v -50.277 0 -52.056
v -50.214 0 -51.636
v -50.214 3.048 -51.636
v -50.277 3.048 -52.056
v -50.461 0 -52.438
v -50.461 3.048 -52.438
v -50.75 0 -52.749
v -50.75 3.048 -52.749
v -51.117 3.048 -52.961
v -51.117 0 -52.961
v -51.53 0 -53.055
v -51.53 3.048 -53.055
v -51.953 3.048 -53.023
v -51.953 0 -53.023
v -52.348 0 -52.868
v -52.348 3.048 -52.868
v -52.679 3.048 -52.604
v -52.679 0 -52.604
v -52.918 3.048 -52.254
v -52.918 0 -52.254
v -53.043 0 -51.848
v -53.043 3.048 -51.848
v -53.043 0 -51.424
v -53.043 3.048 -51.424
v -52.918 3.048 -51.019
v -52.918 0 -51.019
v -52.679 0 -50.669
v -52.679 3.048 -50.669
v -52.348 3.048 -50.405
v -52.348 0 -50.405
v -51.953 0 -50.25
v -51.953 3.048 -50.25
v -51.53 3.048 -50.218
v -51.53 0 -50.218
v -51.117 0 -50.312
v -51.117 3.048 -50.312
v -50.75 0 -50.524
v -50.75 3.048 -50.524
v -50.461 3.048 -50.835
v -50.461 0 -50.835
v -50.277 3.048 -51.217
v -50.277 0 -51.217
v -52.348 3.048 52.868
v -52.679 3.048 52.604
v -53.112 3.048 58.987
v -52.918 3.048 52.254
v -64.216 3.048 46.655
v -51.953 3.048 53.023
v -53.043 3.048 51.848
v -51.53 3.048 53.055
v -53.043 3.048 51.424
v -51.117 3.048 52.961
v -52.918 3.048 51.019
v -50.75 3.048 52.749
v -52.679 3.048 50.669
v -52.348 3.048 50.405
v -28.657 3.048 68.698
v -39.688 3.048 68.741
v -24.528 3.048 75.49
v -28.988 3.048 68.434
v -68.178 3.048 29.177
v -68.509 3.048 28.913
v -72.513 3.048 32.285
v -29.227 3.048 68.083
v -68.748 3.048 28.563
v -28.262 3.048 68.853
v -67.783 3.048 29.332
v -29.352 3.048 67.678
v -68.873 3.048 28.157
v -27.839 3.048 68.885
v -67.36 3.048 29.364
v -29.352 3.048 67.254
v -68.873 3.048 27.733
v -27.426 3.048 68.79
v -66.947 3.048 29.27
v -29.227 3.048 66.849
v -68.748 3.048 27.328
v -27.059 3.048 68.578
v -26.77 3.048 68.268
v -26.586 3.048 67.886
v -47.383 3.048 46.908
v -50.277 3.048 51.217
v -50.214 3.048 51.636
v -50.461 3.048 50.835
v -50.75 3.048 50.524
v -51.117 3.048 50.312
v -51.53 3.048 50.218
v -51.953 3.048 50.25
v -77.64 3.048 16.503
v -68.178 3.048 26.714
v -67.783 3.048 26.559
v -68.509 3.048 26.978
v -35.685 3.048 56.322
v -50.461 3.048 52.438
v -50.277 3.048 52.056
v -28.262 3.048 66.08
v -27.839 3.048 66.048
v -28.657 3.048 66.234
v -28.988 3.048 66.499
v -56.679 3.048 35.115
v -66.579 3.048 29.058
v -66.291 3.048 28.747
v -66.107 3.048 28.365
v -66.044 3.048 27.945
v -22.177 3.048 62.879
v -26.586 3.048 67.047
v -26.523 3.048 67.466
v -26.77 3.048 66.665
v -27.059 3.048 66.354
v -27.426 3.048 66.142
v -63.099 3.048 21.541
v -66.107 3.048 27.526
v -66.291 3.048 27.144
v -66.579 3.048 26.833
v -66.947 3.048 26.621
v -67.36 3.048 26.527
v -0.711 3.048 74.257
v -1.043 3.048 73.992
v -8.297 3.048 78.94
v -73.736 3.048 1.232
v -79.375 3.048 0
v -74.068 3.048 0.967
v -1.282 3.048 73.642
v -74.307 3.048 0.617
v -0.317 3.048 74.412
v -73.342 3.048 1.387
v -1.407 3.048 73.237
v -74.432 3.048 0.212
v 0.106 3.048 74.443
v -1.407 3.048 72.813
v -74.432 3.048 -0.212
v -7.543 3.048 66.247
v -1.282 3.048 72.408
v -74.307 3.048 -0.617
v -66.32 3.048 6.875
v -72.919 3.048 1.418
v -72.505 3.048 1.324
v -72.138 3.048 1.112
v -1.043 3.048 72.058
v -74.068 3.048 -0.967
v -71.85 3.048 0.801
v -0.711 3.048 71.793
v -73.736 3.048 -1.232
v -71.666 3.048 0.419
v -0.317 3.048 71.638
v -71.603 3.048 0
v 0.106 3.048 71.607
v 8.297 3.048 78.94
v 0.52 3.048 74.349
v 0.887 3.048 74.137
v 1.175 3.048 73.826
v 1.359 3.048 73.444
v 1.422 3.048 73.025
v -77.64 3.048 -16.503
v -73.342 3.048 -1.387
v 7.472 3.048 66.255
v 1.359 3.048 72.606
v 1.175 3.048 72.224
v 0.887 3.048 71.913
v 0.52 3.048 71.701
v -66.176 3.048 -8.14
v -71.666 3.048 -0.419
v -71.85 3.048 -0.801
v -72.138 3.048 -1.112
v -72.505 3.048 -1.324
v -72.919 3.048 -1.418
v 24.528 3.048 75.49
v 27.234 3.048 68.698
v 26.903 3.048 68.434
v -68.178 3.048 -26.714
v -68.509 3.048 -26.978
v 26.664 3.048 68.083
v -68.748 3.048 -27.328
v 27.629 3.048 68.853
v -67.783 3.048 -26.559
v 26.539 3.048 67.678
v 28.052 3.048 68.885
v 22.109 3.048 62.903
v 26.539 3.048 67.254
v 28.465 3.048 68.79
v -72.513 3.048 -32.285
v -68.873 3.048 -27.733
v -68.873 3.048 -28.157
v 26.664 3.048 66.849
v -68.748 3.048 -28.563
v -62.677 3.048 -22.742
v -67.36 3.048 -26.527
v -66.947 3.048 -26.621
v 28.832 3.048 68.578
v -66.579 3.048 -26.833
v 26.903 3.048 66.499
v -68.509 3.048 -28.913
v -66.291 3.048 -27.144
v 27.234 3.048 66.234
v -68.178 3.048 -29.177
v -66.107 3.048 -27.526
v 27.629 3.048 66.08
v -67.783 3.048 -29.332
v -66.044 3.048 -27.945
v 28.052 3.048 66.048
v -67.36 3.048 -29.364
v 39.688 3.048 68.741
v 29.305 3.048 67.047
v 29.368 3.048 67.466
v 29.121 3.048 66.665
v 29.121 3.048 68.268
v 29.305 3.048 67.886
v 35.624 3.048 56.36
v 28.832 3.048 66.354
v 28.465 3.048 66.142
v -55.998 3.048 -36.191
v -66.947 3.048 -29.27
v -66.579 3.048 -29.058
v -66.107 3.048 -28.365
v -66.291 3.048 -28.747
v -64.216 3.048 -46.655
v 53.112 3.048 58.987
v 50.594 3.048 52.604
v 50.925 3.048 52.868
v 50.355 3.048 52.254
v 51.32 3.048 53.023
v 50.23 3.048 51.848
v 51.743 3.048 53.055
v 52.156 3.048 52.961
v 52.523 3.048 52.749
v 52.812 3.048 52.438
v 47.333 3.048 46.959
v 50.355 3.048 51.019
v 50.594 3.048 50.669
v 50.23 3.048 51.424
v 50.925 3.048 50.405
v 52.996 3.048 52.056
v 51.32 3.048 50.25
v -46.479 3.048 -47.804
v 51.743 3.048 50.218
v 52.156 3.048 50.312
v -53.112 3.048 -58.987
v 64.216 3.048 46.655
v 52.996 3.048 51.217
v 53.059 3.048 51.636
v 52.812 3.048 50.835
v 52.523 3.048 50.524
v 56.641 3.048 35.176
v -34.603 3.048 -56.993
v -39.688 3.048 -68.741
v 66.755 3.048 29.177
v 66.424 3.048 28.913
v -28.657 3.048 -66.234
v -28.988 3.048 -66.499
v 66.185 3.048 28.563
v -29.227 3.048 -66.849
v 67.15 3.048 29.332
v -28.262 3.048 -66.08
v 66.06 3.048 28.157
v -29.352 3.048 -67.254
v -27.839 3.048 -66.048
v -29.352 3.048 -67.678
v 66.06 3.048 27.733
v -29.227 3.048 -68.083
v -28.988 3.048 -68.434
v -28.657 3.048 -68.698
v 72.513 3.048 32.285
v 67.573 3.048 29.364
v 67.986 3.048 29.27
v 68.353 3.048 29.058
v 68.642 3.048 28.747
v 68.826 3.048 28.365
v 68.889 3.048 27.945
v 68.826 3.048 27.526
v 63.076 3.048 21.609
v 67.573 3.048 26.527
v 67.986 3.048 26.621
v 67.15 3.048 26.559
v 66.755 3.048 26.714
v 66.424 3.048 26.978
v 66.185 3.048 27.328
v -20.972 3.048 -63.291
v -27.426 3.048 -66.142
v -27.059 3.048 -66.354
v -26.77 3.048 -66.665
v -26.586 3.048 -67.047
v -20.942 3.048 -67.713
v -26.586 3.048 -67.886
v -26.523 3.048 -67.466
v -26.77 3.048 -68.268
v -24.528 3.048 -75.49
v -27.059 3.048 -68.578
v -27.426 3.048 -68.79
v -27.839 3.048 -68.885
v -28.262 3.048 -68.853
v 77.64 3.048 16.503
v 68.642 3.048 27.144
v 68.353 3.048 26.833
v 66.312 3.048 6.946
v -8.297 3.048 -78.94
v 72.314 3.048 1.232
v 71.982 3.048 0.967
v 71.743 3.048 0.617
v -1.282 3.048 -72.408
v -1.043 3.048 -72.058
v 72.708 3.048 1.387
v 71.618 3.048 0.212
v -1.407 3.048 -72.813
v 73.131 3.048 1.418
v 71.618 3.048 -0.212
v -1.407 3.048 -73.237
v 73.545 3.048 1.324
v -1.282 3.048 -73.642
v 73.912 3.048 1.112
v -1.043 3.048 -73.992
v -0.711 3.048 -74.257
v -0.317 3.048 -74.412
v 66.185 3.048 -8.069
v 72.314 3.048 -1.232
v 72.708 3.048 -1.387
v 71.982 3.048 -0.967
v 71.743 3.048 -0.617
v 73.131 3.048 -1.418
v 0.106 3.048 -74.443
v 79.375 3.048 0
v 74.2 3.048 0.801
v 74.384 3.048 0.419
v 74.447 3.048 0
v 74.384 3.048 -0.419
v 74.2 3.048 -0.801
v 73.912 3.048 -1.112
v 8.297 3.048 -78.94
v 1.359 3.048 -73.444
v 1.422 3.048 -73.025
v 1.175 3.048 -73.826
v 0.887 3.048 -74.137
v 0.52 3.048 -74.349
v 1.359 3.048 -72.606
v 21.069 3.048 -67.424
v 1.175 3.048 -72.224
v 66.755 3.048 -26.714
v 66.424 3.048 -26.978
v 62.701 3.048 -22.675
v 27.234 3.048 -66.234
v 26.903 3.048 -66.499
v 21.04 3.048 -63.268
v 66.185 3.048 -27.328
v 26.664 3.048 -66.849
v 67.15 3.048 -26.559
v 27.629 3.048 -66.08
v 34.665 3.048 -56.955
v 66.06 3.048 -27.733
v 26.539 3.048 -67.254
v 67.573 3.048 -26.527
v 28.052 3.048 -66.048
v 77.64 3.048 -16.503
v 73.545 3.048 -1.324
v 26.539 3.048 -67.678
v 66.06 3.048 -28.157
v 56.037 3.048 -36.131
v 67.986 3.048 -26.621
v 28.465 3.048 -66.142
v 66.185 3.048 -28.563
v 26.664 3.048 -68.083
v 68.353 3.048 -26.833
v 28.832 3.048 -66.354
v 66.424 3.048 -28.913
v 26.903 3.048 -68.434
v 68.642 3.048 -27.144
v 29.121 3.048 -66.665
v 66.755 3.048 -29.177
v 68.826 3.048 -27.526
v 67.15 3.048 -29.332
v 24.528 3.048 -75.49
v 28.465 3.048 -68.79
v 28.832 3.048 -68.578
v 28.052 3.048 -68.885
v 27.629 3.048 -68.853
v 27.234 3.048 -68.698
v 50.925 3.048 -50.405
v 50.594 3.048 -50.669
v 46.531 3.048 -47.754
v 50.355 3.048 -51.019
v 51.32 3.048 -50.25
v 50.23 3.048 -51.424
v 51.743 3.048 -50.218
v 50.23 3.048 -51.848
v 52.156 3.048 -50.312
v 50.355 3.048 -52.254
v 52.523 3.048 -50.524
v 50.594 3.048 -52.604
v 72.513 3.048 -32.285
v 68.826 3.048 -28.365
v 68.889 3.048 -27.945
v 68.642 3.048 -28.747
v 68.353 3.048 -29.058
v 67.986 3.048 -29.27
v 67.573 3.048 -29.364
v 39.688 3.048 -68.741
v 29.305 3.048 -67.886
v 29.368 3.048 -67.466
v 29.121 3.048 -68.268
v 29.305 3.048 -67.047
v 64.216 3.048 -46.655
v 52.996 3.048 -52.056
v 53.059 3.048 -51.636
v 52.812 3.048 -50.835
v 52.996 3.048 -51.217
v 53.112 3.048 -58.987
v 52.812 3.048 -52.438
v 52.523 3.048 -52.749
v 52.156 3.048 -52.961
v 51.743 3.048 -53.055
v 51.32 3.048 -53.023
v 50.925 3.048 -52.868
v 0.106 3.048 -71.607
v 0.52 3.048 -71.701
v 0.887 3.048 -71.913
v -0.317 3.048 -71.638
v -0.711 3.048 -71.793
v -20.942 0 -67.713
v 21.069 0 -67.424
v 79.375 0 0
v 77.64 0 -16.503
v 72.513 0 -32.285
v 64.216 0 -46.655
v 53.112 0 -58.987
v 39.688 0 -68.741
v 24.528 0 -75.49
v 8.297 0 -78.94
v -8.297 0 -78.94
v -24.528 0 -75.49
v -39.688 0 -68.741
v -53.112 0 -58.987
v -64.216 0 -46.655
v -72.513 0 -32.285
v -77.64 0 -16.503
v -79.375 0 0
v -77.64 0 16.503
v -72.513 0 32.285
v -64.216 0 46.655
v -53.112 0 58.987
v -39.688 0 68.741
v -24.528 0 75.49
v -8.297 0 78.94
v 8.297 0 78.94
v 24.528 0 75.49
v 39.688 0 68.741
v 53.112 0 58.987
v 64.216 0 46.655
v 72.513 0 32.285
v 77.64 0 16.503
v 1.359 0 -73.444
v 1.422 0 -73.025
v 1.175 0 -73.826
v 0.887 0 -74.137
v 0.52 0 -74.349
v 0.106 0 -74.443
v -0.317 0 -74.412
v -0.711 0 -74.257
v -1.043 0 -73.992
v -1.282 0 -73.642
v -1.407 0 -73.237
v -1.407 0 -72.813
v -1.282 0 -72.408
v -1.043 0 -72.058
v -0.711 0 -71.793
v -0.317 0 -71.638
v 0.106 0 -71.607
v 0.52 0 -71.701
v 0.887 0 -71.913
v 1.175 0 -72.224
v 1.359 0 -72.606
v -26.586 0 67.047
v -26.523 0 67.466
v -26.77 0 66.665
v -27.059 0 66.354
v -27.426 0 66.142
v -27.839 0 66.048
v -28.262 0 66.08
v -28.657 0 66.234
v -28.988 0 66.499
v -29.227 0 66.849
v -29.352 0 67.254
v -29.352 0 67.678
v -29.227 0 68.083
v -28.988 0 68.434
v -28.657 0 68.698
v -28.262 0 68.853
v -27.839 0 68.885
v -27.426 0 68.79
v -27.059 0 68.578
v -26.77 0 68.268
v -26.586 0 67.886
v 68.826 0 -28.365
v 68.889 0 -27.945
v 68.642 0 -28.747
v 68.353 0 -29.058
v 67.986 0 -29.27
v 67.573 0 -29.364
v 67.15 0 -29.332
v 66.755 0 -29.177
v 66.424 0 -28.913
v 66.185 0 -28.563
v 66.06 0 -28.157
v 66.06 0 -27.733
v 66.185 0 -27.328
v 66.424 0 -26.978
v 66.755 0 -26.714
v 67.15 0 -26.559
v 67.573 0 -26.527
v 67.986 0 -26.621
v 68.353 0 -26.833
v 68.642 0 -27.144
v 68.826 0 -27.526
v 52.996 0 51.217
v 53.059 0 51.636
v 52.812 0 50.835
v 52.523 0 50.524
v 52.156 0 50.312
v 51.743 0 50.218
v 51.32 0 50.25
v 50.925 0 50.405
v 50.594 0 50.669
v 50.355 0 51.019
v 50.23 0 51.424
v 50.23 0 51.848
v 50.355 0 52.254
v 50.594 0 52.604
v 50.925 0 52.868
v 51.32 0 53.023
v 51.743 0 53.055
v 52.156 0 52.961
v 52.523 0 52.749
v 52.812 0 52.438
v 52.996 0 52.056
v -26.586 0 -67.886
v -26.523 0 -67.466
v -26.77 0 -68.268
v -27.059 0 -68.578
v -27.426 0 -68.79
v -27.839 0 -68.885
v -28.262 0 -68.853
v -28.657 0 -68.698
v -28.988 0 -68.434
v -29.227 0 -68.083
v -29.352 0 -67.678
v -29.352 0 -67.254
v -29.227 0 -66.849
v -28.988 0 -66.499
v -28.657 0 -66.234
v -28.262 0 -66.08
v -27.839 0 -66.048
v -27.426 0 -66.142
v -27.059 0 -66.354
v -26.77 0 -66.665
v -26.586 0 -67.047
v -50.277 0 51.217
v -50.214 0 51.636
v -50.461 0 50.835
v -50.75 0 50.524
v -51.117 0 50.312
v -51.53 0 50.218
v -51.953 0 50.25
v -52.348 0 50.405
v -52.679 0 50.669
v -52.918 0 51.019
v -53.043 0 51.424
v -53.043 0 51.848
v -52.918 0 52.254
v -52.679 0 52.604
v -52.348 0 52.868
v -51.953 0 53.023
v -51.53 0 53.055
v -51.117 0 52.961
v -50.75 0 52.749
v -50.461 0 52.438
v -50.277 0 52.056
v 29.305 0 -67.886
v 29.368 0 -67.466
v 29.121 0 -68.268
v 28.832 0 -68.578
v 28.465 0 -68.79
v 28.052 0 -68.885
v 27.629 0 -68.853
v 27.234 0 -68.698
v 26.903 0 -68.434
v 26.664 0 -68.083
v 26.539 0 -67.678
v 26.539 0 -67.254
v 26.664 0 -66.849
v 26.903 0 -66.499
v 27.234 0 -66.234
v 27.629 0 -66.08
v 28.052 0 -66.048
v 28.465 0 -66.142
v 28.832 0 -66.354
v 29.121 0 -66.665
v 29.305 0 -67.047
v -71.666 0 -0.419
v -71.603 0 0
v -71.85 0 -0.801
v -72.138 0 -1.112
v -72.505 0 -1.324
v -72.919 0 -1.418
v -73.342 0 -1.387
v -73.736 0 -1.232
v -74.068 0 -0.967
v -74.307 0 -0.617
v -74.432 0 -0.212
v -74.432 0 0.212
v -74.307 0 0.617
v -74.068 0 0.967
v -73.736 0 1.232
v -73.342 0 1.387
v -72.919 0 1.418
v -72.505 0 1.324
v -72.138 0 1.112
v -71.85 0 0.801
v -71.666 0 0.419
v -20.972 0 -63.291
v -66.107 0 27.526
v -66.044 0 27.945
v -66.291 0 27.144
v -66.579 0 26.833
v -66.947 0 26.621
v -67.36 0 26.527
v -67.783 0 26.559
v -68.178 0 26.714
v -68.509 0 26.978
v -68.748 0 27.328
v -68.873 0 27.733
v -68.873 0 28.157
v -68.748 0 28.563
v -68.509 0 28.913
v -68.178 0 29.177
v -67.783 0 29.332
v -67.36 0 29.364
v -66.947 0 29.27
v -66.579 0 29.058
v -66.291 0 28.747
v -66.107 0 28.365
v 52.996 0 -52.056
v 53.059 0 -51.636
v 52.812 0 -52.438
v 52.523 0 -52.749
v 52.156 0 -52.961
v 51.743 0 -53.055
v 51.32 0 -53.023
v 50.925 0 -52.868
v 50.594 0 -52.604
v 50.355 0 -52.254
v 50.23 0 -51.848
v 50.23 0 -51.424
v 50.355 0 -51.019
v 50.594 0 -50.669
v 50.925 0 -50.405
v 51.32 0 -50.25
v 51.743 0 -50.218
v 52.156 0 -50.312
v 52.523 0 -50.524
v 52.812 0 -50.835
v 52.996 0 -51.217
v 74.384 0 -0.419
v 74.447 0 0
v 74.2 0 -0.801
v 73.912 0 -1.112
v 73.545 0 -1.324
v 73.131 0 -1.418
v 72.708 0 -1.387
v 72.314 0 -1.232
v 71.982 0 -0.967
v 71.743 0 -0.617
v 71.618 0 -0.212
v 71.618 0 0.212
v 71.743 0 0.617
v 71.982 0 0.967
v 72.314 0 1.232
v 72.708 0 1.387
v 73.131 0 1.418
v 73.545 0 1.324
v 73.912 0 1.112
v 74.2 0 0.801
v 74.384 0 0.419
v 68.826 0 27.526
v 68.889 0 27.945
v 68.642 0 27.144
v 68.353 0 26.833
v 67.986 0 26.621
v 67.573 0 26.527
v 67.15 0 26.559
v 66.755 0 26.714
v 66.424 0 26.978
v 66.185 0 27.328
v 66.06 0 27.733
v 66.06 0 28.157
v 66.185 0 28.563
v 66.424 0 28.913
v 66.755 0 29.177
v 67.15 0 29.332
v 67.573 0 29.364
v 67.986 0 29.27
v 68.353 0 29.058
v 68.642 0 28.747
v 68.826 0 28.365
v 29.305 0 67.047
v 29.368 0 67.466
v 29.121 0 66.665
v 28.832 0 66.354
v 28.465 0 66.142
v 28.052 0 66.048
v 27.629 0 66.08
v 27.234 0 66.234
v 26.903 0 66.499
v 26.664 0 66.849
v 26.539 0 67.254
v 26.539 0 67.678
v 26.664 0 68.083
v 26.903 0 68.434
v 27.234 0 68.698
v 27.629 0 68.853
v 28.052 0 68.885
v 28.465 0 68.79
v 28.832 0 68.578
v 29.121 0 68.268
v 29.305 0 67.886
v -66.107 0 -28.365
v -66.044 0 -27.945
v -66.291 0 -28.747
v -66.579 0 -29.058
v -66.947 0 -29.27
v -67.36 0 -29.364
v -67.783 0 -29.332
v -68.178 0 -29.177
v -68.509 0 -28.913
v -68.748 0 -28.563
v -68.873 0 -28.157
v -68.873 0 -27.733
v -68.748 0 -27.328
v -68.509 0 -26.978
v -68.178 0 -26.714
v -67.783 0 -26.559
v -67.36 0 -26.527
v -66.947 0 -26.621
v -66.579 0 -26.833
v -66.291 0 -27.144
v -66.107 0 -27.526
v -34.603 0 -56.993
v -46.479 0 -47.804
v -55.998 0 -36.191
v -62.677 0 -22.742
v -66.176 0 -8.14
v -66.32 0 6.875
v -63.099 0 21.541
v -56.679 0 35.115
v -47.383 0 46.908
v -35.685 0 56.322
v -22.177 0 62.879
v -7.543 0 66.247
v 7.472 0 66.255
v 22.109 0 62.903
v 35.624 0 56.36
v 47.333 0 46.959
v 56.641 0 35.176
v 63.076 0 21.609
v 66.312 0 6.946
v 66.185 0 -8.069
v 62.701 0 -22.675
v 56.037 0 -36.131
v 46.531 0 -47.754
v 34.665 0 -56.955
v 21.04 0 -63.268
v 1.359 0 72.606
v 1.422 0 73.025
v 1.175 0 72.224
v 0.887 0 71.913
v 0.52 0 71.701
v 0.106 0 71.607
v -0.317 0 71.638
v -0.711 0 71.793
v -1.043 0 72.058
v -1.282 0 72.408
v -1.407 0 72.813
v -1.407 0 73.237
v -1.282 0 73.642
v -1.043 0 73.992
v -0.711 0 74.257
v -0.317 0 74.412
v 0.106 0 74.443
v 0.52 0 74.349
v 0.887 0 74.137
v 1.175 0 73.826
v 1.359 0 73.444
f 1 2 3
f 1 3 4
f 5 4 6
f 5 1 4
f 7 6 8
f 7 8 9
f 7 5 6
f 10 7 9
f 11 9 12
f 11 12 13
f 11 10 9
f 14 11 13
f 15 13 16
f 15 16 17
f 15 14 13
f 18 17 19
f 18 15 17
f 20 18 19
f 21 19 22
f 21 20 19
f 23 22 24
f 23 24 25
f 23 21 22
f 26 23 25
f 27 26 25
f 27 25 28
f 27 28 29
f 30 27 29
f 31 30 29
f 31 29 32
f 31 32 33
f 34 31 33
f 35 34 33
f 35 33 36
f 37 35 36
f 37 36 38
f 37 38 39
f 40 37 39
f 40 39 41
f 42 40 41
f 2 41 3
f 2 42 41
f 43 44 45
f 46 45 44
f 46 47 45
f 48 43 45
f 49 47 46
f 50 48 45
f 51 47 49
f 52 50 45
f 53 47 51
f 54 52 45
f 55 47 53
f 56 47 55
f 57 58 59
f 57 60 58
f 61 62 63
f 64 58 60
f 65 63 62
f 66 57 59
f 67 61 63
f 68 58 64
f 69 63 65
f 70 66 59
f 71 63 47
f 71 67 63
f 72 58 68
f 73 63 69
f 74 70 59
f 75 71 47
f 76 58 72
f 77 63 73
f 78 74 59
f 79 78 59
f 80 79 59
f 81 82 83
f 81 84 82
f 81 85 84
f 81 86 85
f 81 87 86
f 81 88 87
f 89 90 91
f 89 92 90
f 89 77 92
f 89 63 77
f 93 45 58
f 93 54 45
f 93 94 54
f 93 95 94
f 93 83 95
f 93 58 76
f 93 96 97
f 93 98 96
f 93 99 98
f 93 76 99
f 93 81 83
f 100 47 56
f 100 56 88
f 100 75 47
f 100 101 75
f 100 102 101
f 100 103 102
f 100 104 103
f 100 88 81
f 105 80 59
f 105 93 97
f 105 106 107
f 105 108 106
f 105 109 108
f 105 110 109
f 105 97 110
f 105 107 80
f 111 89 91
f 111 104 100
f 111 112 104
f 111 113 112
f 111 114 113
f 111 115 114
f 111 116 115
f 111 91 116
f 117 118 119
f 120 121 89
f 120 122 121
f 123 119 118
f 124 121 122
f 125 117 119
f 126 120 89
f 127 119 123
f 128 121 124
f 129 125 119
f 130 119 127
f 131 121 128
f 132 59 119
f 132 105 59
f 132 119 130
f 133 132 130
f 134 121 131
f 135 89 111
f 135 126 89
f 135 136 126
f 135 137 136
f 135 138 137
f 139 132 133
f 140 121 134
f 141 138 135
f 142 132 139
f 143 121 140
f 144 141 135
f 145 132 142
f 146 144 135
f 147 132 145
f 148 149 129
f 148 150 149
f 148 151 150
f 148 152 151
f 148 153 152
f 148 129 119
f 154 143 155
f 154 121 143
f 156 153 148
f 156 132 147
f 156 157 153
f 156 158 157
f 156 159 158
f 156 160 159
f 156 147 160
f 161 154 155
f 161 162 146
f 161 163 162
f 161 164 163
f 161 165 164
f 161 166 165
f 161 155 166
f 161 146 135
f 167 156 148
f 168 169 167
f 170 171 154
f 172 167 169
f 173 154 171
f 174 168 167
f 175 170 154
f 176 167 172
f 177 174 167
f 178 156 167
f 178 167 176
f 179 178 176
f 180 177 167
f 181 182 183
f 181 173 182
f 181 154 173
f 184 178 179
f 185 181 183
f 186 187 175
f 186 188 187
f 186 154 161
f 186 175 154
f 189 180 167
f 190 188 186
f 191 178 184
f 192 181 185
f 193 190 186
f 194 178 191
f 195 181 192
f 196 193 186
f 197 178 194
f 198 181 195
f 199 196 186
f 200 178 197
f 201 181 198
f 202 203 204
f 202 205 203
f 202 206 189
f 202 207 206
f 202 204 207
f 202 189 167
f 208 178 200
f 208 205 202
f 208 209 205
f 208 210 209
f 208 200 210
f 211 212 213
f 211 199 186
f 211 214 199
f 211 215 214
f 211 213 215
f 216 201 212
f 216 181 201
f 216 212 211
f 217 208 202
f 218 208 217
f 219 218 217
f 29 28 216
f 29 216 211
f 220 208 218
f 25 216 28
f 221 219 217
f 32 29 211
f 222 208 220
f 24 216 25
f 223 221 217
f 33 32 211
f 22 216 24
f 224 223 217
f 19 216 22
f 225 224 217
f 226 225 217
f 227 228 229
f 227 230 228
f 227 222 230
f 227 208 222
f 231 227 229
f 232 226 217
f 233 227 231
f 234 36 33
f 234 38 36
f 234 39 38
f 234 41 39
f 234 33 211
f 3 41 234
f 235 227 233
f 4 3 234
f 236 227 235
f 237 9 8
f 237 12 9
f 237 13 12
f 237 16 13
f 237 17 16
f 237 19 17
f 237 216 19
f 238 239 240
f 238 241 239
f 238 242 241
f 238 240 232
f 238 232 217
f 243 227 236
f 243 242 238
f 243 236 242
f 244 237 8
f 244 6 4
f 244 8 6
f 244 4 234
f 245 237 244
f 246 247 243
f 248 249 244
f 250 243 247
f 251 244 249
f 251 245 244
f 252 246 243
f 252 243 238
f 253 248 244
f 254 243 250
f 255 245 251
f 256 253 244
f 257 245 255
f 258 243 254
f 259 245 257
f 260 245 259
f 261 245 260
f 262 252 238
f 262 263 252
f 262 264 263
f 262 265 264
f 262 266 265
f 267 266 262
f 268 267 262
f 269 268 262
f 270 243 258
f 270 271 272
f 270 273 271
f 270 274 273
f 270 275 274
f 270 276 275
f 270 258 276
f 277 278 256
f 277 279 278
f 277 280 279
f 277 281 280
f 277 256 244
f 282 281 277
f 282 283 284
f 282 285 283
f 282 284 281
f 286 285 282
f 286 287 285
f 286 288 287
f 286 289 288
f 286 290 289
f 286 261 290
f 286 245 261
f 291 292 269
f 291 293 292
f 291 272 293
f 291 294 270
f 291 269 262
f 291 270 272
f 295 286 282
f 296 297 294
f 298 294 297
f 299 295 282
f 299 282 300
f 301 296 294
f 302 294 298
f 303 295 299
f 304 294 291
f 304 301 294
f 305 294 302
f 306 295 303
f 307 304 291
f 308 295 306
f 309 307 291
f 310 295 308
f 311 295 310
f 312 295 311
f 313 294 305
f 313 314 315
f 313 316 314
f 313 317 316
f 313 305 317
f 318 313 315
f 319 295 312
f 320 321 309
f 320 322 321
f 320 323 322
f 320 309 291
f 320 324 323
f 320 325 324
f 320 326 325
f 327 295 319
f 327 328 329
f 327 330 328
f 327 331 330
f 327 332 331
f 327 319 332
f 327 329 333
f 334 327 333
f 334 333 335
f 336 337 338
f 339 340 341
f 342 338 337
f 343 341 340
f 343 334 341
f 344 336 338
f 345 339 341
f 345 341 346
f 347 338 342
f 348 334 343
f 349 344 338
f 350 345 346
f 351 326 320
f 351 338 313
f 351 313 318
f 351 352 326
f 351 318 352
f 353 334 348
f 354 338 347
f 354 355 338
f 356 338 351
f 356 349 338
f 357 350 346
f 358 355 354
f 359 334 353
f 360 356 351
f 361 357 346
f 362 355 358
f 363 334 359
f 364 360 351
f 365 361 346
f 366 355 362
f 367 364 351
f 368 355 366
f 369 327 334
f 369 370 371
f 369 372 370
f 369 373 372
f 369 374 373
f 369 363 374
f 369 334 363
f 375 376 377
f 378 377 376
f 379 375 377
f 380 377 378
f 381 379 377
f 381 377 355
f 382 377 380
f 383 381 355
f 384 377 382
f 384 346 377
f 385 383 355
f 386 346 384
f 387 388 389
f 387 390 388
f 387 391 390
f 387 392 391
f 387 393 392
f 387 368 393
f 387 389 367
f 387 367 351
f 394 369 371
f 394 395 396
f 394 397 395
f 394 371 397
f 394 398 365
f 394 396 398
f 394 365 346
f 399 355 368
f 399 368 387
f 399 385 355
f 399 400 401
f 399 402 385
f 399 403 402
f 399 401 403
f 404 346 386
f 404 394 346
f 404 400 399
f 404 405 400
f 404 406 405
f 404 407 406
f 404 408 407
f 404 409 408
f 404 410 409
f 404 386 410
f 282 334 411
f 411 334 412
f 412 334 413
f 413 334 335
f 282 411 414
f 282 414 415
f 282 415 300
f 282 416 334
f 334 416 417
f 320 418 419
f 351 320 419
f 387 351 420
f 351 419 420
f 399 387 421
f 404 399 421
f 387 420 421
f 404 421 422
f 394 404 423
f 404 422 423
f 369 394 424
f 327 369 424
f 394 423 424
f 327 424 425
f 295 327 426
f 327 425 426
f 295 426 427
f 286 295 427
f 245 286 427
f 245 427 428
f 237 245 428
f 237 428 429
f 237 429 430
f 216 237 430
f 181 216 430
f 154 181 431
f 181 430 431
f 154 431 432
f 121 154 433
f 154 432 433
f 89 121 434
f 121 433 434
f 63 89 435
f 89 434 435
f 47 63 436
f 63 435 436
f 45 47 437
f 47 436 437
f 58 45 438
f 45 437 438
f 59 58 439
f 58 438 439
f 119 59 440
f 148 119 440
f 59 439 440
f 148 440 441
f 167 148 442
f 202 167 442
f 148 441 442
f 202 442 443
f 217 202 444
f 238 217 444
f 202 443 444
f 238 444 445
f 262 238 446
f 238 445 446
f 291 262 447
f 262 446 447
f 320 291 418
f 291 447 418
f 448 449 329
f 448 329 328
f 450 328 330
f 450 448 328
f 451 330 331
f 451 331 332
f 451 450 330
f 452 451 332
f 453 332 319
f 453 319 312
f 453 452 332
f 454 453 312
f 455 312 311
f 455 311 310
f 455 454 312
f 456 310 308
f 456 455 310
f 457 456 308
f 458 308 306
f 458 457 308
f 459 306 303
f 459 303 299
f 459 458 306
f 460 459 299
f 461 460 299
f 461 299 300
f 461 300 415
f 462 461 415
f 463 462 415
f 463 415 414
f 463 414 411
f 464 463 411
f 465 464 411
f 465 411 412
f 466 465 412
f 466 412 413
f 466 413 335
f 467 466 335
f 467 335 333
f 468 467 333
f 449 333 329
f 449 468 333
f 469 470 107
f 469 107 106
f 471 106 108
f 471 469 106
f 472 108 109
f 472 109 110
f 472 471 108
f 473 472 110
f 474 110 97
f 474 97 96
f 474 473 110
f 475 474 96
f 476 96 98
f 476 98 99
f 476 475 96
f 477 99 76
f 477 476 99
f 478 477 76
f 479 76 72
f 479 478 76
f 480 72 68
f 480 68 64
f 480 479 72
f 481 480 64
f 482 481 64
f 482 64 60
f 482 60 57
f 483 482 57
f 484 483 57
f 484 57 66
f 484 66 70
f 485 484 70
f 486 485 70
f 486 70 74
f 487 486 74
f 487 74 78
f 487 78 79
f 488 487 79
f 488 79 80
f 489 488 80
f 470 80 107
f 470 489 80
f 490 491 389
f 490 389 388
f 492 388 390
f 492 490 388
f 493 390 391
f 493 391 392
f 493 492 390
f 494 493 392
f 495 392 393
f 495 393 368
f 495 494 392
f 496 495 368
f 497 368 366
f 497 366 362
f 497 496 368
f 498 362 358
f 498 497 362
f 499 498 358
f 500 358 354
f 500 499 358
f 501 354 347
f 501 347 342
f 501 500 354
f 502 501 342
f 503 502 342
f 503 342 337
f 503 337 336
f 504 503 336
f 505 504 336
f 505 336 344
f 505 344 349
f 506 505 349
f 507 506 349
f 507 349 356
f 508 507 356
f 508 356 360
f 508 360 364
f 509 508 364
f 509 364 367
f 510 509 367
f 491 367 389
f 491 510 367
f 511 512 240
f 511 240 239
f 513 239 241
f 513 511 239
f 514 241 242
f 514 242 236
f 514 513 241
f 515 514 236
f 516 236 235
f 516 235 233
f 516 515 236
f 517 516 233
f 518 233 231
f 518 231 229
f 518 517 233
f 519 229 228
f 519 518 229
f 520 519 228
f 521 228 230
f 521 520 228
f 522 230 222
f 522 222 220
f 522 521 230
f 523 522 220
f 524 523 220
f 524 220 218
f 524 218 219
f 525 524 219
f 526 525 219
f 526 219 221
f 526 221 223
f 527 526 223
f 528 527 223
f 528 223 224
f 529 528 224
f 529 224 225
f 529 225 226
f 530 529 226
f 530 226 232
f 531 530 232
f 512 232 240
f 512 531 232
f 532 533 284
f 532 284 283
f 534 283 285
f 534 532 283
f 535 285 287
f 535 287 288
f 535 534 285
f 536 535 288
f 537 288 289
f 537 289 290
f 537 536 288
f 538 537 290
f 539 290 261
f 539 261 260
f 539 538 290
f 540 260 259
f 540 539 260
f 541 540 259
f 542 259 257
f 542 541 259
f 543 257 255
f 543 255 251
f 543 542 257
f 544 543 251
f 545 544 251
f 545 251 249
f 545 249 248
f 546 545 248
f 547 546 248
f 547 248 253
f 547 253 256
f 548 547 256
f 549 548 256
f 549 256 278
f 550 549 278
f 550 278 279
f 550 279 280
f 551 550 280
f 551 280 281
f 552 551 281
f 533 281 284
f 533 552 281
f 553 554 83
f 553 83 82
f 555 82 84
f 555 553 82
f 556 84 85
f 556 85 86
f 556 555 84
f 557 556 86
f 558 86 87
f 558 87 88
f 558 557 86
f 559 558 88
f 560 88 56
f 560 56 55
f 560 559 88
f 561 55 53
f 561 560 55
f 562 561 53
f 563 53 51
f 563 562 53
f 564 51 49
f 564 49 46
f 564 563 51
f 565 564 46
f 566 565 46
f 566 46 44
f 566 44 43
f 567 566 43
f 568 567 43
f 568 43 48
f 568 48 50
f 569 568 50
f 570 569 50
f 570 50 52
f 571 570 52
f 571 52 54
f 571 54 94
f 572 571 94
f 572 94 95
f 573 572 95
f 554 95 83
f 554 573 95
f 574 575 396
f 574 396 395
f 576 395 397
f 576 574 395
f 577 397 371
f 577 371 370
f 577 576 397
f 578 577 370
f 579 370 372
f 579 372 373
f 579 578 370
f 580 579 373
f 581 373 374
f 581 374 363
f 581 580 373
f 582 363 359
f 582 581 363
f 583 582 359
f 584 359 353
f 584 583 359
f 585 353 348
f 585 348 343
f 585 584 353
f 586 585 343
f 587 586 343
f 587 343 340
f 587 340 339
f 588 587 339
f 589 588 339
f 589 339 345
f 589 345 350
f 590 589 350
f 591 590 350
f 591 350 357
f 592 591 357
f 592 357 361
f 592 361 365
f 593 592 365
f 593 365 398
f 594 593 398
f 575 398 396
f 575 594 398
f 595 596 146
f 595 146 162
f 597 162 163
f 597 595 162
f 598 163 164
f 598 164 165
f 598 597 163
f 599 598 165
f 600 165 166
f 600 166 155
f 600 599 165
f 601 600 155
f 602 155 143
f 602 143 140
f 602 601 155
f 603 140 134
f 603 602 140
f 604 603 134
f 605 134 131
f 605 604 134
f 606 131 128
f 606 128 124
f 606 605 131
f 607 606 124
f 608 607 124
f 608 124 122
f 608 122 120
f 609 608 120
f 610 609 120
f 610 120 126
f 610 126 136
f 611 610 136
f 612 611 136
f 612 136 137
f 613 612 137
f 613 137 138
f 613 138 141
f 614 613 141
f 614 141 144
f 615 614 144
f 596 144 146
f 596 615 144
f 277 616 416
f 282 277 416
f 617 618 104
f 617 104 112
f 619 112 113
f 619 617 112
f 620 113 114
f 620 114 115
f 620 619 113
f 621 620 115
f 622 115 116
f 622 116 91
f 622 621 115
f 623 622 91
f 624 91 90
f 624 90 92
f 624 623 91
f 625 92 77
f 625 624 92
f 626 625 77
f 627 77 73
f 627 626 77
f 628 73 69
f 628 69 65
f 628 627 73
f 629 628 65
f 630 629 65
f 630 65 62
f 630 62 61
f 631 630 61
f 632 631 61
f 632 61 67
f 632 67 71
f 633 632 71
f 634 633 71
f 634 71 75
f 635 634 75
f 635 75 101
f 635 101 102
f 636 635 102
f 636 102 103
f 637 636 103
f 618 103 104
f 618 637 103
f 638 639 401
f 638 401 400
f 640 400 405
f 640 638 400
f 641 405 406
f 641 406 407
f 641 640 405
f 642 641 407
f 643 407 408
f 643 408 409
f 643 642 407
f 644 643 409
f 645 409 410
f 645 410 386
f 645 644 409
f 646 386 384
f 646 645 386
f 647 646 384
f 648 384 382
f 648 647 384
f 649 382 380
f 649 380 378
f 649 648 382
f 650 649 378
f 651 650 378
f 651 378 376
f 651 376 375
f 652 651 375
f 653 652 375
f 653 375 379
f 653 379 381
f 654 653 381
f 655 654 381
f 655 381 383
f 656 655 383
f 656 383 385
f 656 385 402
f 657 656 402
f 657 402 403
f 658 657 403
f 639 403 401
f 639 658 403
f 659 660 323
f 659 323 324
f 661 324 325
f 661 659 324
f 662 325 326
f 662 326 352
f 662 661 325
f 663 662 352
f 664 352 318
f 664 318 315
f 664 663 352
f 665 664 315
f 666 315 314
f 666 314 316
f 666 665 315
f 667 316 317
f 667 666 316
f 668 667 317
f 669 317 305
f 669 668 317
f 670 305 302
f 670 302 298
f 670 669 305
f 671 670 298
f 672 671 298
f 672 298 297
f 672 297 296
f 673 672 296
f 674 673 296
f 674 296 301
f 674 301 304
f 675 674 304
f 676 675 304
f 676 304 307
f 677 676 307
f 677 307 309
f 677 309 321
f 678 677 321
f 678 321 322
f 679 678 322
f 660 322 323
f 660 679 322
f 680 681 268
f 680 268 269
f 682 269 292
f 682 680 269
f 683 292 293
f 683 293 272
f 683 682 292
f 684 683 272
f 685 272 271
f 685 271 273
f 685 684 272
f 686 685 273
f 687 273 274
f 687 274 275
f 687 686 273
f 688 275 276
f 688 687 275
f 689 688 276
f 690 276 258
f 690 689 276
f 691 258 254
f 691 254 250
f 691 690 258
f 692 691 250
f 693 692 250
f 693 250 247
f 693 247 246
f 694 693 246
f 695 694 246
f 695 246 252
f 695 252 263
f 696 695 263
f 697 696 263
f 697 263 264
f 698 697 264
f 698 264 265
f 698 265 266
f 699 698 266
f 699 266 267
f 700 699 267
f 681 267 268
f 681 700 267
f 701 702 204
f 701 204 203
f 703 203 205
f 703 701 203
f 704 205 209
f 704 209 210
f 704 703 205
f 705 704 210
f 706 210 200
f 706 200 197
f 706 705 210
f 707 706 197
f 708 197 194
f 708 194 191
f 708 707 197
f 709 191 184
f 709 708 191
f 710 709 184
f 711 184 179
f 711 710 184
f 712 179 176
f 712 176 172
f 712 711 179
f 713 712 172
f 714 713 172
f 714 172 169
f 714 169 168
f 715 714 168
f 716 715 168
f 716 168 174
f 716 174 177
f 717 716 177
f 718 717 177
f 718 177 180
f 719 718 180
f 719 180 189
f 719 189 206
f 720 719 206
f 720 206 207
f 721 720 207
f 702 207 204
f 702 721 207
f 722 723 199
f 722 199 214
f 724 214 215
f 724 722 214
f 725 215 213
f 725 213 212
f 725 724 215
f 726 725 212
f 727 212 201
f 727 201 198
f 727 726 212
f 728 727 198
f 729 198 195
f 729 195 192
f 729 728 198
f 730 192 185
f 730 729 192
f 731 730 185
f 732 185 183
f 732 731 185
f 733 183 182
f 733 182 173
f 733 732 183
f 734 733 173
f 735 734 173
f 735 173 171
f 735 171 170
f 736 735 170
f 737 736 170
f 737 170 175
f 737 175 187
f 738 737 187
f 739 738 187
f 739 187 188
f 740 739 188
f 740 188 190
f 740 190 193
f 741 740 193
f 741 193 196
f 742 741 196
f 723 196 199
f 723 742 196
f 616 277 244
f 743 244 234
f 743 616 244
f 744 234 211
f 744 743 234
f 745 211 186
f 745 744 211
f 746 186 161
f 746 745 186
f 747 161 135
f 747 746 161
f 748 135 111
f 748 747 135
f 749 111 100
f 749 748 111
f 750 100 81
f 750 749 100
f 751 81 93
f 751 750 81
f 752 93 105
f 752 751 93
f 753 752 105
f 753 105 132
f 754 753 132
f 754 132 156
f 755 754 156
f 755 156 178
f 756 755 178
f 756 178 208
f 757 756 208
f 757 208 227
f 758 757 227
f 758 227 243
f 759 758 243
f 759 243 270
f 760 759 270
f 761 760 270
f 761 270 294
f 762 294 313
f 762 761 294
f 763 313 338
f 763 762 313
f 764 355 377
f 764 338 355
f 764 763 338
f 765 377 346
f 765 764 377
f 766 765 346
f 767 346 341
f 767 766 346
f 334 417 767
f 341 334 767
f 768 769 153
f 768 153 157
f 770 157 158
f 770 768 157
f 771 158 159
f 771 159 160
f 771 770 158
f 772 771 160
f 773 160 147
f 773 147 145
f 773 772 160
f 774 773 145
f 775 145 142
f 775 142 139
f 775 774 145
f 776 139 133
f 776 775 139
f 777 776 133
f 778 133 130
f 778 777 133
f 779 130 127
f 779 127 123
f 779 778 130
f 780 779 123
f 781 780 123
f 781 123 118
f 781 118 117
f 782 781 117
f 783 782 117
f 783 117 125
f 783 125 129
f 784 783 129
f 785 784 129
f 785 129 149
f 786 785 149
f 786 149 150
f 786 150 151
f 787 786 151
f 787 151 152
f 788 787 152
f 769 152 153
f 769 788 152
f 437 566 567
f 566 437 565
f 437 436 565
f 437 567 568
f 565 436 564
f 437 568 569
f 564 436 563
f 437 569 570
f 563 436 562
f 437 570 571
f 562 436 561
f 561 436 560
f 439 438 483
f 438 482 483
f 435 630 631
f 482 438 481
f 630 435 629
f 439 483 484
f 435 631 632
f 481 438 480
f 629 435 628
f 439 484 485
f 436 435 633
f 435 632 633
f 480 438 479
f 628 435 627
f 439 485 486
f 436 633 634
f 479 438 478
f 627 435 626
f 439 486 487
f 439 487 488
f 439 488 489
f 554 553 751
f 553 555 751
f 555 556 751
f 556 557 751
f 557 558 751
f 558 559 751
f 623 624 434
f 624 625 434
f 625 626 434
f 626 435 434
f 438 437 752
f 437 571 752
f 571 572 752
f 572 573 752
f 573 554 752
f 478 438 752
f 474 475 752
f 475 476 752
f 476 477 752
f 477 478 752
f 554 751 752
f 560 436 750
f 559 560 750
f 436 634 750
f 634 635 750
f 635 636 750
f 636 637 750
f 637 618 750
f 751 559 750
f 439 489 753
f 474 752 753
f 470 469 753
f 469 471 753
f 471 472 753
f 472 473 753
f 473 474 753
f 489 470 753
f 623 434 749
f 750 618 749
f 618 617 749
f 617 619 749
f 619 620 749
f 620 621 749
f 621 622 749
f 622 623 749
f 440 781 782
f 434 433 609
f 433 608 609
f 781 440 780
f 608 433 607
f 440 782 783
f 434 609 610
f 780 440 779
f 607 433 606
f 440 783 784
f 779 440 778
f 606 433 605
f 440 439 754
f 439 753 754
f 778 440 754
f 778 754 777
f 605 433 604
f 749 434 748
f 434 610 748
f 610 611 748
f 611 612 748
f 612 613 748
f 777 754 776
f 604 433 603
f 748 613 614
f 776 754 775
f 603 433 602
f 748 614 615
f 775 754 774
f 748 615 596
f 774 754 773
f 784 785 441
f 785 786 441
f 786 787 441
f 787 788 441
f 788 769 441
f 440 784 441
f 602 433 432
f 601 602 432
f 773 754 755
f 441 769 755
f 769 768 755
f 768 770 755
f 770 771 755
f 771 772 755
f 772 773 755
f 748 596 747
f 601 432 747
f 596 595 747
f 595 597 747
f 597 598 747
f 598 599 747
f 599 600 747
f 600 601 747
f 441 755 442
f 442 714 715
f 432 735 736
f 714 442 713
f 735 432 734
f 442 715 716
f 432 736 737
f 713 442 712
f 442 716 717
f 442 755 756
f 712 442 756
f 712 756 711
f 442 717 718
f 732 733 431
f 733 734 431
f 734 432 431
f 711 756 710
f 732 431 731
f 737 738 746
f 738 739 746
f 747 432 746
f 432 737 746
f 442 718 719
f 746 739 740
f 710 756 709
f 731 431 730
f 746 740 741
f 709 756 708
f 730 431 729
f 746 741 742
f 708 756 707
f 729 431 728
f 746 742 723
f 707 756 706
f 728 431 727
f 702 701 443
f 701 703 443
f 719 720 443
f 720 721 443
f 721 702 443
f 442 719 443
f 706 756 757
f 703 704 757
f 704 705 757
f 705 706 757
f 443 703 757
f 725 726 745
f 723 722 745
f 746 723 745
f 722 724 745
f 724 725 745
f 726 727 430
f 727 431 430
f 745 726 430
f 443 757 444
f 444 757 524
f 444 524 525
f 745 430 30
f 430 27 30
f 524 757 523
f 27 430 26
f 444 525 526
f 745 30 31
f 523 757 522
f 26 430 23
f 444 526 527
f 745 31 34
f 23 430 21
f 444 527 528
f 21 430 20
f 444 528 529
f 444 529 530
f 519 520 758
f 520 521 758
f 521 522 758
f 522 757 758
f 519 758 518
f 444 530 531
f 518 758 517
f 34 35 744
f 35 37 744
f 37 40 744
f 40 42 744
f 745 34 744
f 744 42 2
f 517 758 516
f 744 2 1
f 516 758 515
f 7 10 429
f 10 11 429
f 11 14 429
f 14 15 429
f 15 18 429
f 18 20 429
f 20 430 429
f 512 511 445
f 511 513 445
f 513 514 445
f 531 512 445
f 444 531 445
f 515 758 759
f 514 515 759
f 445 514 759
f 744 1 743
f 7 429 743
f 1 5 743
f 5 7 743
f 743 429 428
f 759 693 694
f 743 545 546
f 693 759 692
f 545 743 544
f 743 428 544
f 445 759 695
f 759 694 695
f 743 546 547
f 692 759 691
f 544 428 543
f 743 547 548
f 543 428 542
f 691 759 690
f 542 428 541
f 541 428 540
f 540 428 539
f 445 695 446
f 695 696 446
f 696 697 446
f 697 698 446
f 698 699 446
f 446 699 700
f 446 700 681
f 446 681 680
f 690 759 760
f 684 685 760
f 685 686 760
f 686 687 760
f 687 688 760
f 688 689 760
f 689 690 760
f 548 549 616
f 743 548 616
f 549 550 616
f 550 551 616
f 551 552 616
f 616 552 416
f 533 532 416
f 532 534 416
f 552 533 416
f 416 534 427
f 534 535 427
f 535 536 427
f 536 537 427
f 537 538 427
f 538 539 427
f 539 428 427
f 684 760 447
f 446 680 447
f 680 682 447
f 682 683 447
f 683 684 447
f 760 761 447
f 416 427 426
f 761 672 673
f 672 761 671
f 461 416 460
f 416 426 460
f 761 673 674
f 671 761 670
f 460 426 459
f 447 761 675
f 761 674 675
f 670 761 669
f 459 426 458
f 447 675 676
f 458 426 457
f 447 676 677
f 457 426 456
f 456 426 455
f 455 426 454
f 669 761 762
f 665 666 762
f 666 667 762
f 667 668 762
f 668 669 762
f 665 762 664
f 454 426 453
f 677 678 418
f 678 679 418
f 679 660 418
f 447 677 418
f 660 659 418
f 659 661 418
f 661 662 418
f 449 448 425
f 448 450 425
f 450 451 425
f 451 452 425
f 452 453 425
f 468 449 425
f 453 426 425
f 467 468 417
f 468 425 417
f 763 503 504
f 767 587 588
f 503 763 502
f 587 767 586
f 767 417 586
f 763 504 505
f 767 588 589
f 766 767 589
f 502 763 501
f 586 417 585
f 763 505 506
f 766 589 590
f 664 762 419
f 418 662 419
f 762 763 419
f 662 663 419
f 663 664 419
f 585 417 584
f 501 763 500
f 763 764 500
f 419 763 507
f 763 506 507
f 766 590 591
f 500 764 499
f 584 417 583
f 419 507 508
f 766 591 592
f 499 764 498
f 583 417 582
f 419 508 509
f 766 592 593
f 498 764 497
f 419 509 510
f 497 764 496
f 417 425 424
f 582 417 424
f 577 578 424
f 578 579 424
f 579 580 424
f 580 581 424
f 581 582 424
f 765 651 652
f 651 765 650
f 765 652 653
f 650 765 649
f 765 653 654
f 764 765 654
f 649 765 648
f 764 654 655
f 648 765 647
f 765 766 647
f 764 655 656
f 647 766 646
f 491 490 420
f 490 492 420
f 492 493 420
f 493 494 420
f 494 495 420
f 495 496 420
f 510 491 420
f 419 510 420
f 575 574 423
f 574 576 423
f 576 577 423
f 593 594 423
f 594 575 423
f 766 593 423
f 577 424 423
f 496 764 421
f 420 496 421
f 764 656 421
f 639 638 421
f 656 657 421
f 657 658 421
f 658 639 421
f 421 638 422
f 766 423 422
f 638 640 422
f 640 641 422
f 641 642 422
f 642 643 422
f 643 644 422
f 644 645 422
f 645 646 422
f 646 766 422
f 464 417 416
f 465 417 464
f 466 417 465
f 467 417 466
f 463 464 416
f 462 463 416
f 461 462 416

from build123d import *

# Parameters (mm, degrees)
SKETCH2_R           = 79.375
SKETCH2_R_2         = 66.675
SKETCH2_R_3         = 1.4224
BOSS_EXTRUDE1_DEPTH = 3.048
CUT_EXTRUDE2_DEPTH  = 4.048


with BuildPart() as part:
    # Sketch2 → Boss-Extrude1 (new body)
    with BuildSketch(Plane(origin=(0, 0, 0), x_dir=(1, 0, 0), z_dir=(0, 1, 0))):
        Circle(SKETCH2_R)
        Circle(SKETCH2_R_2, mode=Mode.SUBTRACT)
        with Locations((0, 73.025)):
            Circle(SKETCH2_R_3, mode=Mode.SUBTRACT)
        with Locations((27.945457648, 67.466302862)):
            Circle(SKETCH2_R_3, mode=Mode.SUBTRACT)
        with Locations((51.636472696, 51.636472696)):
            Circle(SKETCH2_R_3, mode=Mode.SUBTRACT)
        with Locations((67.466302862, 27.945457648)):
            Circle(SKETCH2_R_3, mode=Mode.SUBTRACT)
        with Locations((73.025, 0)):
            Circle(SKETCH2_R_3, mode=Mode.SUBTRACT)
        with Locations((67.466302862, -27.945457648)):
            Circle(SKETCH2_R_3, mode=Mode.SUBTRACT)
        with Locations((51.636472696, -51.636472696)):
            Circle(SKETCH2_R_3, mode=Mode.SUBTRACT)
        with Locations((27.945457648, -67.466302862)):
            Circle(SKETCH2_R_3, mode=Mode.SUBTRACT)
        with Locations((0, -73.025)):
            Circle(SKETCH2_R_3, mode=Mode.SUBTRACT)
        with Locations((-27.945457648, -67.466302862)):
            Circle(SKETCH2_R_3, mode=Mode.SUBTRACT)
        with Locations((-51.636472696, -51.636472696)):
            Circle(SKETCH2_R_3, mode=Mode.SUBTRACT)
        with Locations((-67.466302862, -27.945457648)):
            Circle(SKETCH2_R_3, mode=Mode.SUBTRACT)
        with Locations((-73.025, 0)):
            Circle(SKETCH2_R_3, mode=Mode.SUBTRACT)
        with Locations((-67.466302862, 27.945457648)):
            Circle(SKETCH2_R_3, mode=Mode.SUBTRACT)
        with Locations((-51.636472696, 51.636472696)):
            Circle(SKETCH2_R_3, mode=Mode.SUBTRACT)
        with Locations((-27.945457648, 67.466302862)):
            Circle(SKETCH2_R_3, mode=Mode.SUBTRACT)
    extrude(amount=BOSS_EXTRUDE1_DEPTH)

    # Sketch5 → Cut-Extrude2 (cut, through all)
    with BuildSketch(Plane(origin=(0, 0, 0), x_dir=(-1, 0, 0), z_dir=(0, -1, 0))):
        with BuildLine():
            Line((20.972211437, 63.290773202), (20.941758021, 67.713419083))
            Line((20.941758021, 67.713419083), (-21.068846043, 67.42414284))
            Line((-21.068846043, 67.42414284), (-21.040229048, 63.268194115))
            ThreePointArc((-21.040229048, 63.268194115), (-0.03583368, 66.674990371), (20.972211437, 63.290773202))
        make_face()
    extrude(amount=-CUT_EXTRUDE2_DEPTH, mode=Mode.SUBTRACT)


solid = part.part
